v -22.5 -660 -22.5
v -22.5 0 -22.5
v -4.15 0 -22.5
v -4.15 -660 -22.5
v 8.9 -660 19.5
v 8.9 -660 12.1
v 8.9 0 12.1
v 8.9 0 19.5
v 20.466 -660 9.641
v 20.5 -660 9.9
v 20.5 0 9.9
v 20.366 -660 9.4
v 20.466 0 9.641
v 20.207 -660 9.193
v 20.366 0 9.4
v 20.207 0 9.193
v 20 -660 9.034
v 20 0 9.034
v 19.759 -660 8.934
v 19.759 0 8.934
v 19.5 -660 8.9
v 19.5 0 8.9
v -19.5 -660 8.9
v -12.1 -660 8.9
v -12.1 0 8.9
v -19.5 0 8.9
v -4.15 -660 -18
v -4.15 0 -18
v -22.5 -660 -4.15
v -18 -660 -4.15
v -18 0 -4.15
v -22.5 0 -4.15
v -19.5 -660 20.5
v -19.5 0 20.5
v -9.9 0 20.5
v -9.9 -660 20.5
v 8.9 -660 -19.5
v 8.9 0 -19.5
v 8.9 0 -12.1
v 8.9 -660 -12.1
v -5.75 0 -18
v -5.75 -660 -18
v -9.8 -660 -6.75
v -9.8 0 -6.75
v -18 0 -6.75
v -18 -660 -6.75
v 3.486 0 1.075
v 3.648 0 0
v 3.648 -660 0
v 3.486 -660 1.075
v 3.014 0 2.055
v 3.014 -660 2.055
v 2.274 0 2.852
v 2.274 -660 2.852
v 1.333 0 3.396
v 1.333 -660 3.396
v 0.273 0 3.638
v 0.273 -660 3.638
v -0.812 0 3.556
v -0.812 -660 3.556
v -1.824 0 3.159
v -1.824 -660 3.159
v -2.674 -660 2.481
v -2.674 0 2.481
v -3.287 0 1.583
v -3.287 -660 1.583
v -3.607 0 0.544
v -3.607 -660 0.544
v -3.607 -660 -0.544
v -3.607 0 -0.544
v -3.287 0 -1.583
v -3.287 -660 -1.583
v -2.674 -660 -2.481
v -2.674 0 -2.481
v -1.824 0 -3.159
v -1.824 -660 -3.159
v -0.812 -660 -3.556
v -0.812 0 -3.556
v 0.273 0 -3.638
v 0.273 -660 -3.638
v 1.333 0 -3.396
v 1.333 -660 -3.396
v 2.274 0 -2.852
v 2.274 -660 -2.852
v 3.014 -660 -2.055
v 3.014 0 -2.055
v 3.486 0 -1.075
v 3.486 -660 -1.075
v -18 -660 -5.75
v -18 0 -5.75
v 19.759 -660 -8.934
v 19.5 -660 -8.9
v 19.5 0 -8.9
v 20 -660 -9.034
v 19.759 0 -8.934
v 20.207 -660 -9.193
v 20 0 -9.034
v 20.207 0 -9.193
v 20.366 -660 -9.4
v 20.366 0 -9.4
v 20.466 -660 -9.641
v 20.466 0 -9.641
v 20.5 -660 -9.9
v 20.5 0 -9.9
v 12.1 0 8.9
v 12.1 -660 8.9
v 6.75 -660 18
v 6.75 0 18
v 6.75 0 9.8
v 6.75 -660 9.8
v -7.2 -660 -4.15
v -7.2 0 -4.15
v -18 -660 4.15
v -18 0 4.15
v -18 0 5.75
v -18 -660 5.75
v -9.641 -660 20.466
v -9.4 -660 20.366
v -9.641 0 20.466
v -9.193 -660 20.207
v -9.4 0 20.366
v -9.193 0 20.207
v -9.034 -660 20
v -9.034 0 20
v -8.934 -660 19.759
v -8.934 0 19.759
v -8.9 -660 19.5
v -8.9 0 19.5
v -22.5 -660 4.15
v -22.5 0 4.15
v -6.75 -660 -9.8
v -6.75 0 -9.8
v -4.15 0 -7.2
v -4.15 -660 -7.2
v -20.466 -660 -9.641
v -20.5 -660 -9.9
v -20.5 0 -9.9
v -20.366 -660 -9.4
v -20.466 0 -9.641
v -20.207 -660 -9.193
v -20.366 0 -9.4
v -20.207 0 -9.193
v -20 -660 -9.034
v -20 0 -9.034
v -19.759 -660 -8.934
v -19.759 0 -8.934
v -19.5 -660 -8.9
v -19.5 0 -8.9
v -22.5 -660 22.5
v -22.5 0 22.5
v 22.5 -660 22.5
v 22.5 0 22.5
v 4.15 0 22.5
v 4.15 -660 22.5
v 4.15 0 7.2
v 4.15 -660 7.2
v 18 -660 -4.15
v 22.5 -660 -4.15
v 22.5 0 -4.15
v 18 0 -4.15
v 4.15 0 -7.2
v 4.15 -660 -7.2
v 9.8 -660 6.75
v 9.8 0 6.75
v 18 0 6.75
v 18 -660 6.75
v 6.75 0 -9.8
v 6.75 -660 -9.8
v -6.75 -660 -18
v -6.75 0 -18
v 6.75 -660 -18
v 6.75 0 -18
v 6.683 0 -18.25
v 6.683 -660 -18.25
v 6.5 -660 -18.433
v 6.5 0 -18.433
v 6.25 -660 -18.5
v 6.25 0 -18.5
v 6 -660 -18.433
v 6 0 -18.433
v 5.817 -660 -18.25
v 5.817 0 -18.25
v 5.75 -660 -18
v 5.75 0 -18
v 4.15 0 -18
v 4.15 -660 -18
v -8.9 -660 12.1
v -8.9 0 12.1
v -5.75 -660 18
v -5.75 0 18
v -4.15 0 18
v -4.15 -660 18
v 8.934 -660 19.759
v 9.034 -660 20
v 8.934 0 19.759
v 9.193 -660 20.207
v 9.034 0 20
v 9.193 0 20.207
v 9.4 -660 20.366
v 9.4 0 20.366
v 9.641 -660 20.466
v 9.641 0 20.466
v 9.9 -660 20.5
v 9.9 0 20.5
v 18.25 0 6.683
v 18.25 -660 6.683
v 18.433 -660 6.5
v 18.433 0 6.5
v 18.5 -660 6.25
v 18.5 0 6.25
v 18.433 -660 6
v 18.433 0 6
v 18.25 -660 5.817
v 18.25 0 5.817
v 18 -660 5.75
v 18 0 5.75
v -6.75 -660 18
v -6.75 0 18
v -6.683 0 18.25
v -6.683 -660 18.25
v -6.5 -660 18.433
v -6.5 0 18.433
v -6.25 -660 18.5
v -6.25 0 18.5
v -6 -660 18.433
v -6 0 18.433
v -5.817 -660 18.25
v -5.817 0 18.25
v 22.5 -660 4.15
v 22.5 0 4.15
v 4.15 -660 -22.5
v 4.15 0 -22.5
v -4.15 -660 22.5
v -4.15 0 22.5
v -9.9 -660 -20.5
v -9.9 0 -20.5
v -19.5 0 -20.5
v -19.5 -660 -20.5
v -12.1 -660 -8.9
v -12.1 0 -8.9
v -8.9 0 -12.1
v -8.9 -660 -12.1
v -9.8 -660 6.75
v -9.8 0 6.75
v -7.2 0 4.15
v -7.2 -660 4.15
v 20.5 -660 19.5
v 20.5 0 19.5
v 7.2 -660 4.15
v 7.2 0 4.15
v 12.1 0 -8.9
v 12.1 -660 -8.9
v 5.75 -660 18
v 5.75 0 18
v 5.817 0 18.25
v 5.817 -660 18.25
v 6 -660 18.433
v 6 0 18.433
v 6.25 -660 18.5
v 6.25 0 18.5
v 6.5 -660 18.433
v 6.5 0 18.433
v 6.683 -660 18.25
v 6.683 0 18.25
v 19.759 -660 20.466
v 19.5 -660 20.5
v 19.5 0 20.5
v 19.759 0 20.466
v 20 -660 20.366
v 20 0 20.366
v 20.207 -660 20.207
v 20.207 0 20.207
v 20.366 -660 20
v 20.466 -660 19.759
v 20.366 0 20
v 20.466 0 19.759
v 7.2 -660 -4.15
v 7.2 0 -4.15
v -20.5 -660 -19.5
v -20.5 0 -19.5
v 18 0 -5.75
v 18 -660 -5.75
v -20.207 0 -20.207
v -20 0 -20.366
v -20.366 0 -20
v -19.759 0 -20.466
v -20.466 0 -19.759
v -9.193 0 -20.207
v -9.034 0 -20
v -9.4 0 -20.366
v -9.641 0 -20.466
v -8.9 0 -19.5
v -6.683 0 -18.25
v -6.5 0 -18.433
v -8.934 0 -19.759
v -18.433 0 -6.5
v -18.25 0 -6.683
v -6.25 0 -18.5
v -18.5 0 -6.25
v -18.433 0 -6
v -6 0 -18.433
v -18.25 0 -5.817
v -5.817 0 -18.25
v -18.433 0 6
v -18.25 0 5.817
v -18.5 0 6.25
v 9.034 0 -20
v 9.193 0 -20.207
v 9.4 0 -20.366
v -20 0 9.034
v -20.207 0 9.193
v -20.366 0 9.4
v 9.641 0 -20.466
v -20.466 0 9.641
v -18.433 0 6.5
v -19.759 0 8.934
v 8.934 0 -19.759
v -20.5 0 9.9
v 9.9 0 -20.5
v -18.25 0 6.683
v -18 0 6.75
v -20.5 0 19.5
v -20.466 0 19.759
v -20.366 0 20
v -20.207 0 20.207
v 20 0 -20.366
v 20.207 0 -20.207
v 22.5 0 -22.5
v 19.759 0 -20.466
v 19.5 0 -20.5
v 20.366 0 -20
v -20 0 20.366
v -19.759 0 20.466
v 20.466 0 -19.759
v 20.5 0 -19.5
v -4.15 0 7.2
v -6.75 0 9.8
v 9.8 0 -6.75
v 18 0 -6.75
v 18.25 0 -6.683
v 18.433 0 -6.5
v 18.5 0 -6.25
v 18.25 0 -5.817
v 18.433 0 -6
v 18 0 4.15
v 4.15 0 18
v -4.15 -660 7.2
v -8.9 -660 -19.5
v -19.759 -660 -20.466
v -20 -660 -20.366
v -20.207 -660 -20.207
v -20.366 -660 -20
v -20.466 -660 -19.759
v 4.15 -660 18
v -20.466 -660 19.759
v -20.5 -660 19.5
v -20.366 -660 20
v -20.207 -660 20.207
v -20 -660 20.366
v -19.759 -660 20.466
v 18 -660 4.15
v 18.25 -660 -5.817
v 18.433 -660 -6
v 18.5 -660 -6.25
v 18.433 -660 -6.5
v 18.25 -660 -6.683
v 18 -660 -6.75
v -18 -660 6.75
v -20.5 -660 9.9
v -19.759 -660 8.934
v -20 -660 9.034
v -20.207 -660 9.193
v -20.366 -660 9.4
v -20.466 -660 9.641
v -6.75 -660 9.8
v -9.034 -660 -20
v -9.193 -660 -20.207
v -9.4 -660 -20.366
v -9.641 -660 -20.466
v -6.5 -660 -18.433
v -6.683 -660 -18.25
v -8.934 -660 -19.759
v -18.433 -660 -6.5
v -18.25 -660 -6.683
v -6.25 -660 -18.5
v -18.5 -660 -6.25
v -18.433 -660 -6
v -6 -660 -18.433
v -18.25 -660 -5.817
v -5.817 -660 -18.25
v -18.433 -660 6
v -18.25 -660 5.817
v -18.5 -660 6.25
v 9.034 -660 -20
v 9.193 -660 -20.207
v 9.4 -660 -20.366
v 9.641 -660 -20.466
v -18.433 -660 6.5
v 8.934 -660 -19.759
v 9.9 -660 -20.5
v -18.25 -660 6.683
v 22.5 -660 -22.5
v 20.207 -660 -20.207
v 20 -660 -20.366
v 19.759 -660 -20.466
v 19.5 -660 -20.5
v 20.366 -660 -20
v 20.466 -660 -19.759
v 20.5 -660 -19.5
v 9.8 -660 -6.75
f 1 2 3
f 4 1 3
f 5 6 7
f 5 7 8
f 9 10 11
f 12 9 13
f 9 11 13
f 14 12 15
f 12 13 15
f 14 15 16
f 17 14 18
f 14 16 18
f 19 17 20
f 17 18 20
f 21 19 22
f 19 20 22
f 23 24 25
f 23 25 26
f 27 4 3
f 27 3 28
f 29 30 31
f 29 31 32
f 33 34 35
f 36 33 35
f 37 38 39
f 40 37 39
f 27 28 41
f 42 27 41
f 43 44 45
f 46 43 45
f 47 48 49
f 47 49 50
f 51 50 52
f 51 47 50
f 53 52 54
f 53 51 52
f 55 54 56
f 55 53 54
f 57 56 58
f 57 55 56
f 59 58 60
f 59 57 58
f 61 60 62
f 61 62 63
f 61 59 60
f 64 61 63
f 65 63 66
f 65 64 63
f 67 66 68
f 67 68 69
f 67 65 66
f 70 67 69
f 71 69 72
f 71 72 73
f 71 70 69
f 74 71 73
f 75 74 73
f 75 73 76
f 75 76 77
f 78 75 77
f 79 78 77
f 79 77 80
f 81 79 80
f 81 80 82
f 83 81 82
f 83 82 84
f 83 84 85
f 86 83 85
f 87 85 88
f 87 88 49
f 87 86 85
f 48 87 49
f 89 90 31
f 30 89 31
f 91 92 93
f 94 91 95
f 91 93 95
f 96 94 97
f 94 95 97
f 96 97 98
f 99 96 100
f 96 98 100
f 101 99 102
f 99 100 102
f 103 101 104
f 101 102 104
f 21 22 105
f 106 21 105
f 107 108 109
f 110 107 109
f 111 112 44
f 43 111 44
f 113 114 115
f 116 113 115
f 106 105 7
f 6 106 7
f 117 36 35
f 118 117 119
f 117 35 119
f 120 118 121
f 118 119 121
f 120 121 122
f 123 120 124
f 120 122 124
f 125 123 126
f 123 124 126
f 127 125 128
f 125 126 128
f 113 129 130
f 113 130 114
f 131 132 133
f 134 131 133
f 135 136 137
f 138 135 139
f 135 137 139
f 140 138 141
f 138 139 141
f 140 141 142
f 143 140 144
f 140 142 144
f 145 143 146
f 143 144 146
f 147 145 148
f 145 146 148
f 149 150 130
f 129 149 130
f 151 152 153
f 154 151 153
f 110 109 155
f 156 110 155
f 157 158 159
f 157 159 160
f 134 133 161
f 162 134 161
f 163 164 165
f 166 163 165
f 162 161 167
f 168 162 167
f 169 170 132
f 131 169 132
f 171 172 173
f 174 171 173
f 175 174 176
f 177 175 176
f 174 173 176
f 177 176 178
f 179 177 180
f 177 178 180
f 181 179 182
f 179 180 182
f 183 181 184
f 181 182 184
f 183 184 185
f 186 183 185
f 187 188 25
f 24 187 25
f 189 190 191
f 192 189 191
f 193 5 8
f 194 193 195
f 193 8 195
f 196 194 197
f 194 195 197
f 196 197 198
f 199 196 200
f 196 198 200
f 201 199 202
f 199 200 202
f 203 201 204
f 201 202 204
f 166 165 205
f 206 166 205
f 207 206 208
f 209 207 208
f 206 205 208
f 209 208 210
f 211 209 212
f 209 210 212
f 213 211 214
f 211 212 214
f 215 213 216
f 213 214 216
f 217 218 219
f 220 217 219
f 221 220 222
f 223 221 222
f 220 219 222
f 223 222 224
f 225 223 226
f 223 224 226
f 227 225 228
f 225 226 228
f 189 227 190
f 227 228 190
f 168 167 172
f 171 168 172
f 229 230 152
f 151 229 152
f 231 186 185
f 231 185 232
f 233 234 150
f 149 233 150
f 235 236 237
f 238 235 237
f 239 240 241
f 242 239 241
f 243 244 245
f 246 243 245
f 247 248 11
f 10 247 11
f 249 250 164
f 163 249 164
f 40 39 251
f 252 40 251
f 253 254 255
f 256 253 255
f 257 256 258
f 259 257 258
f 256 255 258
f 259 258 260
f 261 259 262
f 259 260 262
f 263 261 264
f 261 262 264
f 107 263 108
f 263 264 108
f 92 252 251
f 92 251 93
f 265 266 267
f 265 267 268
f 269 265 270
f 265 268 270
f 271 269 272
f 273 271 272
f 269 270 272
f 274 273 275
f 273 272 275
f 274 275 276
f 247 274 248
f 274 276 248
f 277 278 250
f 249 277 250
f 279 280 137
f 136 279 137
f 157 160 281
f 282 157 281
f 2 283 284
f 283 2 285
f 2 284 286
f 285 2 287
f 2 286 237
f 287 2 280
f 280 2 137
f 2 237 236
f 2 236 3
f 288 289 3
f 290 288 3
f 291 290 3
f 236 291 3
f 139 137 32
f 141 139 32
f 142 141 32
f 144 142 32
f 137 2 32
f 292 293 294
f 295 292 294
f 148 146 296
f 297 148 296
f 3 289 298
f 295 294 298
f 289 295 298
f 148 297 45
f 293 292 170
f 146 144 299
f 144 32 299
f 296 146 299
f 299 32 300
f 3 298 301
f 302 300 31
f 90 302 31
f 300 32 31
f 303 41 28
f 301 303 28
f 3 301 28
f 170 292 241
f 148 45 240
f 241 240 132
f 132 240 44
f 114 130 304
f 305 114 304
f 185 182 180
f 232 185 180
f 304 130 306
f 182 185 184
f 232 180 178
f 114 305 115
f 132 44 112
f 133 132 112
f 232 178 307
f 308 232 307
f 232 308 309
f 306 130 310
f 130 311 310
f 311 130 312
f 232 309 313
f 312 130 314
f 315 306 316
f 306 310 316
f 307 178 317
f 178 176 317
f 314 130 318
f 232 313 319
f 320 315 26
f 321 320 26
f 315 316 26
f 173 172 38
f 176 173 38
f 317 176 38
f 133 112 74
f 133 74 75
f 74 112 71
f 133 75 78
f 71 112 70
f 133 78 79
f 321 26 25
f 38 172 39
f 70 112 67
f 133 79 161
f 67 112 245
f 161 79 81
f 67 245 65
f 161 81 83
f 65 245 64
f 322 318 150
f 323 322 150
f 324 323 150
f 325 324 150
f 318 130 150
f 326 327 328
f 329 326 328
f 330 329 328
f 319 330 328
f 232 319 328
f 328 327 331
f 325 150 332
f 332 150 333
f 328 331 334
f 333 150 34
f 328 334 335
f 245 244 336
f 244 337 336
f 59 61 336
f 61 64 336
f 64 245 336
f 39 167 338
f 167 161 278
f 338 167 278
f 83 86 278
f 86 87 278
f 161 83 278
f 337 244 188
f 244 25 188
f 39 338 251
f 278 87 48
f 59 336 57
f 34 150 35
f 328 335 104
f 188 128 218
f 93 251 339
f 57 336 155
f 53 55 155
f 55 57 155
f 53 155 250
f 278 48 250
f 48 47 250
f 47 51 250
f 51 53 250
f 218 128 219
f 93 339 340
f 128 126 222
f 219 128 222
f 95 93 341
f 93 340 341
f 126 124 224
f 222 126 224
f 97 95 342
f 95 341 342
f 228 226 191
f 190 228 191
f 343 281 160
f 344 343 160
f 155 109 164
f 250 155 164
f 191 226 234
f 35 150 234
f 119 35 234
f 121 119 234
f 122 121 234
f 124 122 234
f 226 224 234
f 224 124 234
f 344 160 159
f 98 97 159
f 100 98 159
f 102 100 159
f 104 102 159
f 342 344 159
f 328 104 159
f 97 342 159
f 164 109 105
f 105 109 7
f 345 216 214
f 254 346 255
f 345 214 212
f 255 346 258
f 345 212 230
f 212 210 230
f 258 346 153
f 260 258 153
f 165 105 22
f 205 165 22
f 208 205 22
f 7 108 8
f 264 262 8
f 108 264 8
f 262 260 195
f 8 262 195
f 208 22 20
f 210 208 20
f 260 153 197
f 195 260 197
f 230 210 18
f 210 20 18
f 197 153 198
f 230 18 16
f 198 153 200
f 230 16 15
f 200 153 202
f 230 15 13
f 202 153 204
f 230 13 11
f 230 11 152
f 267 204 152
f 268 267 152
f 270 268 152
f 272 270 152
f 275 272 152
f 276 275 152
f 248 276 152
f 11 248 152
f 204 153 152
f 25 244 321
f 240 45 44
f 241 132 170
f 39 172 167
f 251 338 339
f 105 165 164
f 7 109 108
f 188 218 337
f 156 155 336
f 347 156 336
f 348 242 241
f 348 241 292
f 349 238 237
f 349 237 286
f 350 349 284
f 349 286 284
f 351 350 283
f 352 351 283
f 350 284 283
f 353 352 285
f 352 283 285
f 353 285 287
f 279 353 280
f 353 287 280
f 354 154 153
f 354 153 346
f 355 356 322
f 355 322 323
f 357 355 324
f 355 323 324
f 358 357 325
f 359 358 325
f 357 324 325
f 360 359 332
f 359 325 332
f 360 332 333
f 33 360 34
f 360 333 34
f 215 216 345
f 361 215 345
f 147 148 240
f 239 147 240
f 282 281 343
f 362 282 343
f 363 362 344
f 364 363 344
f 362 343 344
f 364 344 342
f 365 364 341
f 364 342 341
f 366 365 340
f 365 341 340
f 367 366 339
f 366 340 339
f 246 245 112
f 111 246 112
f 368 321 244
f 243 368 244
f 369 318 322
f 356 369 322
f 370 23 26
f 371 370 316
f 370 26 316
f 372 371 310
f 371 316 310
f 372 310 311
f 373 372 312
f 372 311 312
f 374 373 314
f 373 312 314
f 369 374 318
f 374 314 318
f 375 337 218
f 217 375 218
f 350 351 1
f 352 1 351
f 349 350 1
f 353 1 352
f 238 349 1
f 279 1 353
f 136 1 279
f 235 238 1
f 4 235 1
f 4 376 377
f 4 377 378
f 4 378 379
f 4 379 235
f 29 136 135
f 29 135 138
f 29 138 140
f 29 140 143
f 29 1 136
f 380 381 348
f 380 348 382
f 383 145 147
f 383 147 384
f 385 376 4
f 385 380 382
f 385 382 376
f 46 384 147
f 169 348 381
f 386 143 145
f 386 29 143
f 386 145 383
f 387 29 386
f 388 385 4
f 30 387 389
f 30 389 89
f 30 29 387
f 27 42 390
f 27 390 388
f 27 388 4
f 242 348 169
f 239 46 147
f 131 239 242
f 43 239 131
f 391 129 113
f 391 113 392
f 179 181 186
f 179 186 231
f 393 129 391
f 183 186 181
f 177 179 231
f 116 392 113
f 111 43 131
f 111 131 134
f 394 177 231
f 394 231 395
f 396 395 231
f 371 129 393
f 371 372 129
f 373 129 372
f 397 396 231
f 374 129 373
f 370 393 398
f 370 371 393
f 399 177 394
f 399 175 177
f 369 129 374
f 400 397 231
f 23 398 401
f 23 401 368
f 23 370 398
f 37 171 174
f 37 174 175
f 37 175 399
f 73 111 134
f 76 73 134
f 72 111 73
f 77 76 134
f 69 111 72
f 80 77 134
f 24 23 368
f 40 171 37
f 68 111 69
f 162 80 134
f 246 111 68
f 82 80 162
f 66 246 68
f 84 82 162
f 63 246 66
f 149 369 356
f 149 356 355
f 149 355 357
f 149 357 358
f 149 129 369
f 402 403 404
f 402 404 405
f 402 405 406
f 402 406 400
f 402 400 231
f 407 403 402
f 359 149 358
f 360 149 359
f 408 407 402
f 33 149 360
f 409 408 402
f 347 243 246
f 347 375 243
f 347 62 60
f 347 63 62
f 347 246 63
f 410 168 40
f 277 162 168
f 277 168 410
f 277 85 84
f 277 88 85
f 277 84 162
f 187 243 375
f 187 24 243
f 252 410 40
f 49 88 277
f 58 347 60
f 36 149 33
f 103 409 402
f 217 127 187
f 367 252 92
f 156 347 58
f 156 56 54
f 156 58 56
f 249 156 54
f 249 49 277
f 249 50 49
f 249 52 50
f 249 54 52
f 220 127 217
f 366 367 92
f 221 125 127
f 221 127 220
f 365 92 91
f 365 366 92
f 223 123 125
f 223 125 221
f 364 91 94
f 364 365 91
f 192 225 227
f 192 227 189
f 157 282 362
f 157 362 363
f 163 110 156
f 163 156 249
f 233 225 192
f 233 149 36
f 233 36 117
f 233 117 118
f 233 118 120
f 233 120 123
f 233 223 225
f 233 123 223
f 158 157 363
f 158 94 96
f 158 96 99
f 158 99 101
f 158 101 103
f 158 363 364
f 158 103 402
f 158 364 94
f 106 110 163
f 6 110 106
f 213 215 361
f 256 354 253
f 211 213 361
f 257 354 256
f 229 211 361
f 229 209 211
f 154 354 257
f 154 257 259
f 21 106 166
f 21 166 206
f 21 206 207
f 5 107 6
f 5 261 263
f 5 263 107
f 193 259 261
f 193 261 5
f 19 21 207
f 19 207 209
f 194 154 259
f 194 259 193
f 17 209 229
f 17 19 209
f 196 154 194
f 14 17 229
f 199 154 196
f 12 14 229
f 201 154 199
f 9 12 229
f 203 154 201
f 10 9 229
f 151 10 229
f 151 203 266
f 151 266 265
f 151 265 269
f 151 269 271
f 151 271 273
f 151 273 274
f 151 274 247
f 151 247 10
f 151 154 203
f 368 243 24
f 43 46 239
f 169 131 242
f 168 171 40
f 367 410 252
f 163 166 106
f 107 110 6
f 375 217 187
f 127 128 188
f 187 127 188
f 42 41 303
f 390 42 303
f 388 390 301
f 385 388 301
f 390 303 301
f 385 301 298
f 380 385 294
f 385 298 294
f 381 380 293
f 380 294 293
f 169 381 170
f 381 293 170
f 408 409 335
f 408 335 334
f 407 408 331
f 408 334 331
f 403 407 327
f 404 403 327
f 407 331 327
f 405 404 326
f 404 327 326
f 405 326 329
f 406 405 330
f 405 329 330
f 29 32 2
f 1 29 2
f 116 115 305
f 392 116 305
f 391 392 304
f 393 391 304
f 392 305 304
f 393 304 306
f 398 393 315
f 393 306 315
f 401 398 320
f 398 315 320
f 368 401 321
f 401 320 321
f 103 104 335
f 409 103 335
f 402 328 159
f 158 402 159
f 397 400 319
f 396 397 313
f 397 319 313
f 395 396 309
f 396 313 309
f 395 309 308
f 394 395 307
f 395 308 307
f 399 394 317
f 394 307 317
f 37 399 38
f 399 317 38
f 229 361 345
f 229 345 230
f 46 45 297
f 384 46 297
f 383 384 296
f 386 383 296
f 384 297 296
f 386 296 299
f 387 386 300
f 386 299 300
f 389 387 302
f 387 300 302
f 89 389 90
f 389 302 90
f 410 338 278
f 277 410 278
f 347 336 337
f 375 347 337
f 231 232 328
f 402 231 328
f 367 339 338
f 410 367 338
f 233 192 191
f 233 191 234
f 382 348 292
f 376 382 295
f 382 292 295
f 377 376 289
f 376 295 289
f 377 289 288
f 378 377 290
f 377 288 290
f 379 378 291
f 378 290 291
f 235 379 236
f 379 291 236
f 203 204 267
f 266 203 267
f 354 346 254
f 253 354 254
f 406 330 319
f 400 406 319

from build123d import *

# Parameters (mm, degrees)
F0_R     = 3.647768
F1_DEPTH = 660


with BuildPart() as f1:
    # F0 (on Front) → F1 (new body)
    with BuildSketch(Plane.XZ):
        with BuildLine():
            Line((-4.15, 22.5), (-22.5, 22.5))
            Line((-22.5, 22.5), (-22.5, 4.15))
            Line((-22.5, 4.15), (-18, 4.15))
            Line((-18, 4.15), (-18, 5.75))
            ThreePointArc((-18, 5.75), (-18.5, 6.25), (-18, 6.75))
            Line((-18, 6.75), (-9.8, 6.75))
            Line((-9.8, 6.75), (-7.2, 4.15))
            Line((-7.2, 4.15), (-7.2, -4.15))
            Line((-7.2, -4.15), (-9.8, -6.75))
            Line((-9.8, -6.75), (-18, -6.75))
            ThreePointArc((-18, -6.75), (-18.5, -6.25), (-18, -5.75))
            Line((-18, -5.75), (-18, -4.15))
            Line((-18, -4.15), (-22.5, -4.15))
            Line((-22.5, -4.15), (-22.5, -22.5))
            Line((-22.5, -22.5), (-4.15, -22.5))
            Line((-4.15, -22.5), (-4.15, -18))
            Line((-4.15, -18), (-5.75, -18))
            ThreePointArc((-5.75, -18), (-6.25, -18.5), (-6.75, -18))
            Line((-6.75, -18), (-6.75, -9.8))
            Line((-6.75, -9.8), (-4.15, -7.2))
            Line((-4.15, -7.2), (4.15, -7.2))
            Line((4.15, -7.2), (6.75, -9.8))
            Line((6.75, -9.8), (6.75, -18))
            ThreePointArc((6.75, -18), (6.25, -18.5), (5.75, -18))
            Line((5.75, -18), (4.15, -18))
            Line((4.15, -18), (4.15, -22.5))
            Line((4.15, -22.5), (22.5, -22.5))
            Line((22.5, -22.5), (22.5, -4.15))
            Line((22.5, -4.15), (18, -4.15))
            Line((18, -4.15), (18, -5.75))
            ThreePointArc((18, -5.75), (18.5, -6.25), (18, -6.75))
            Line((18, -6.75), (9.8, -6.75))
            Line((9.8, -6.75), (7.2, -4.15))
            Line((7.2, -4.15), (7.2, 4.15))
            Line((7.2, 4.15), (9.8, 6.75))
            Line((9.8, 6.75), (18, 6.75))
            ThreePointArc((18, 6.75), (18.5, 6.25), (18, 5.75))
            Line((18, 5.75), (18, 4.15))
            Line((18, 4.15), (22.5, 4.15))
            Line((22.5, 4.15), (22.5, 22.5))
            Line((22.5, 22.5), (4.15, 22.5))
            Line((4.15, 22.5), (4.15, 18))
            Line((4.15, 18), (5.75, 18))
            ThreePointArc((5.75, 18), (6.25, 18.5), (6.75, 18))
            Line((6.75, 18), (6.75, 9.8))
            Line((6.75, 9.8), (4.15, 7.2))
            Line((4.15, 7.2), (-4.15, 7.2))
            Line((-4.15, 7.2), (-6.75, 9.8))
            Line((-6.75, 9.8), (-6.75, 18))
            ThreePointArc((-6.75, 18), (-6.25, 18.5), (-5.75, 18))
            Line((-5.75, 18), (-4.15, 18))
            Line((-4.15, 18), (-4.15, 22.5))
        make_face()
        with BuildLine():
            Line((-8.9, -12.1), (-8.9, -19.5))
            ThreePointArc((-8.9, -19.5), (-9.192893, -20.207107), (-9.9, -20.5))
            Line((-9.9, -20.5), (-19.5, -20.5))
            ThreePointArc((-19.5, -20.5), (-20.207107, -20.207107), (-20.5, -19.5))
            Line((-20.5, -19.5), (-20.5, -9.9))
            ThreePointArc((-20.5, -9.9), (-20.207107, -9.192893), (-19.5, -8.9))
            Line((-19.5, -8.9), (-12.1, -8.9))
            Line((-12.1, -8.9), (-8.9, -12.1))
        make_face(mode=Mode.SUBTRACT)
        with BuildLine():
            Line((8.9, -12.1), (12.1, -8.9))
            Line((12.1, -8.9), (19.5, -8.9))
            ThreePointArc((19.5, -8.9), (20.207107, -9.192893), (20.5, -9.9))
            Line((20.5, -9.9), (20.5, -19.5))
            ThreePointArc((20.5, -19.5), (20.207107, -20.207107), (19.5, -20.5))
            Line((19.5, -20.5), (9.9, -20.5))
            ThreePointArc((9.9, -20.5), (9.192893, -20.207107), (8.9, -19.5))
            Line((8.9, -19.5), (8.9, -12.1))
        make_face(mode=Mode.SUBTRACT)
        with BuildLine():
            ThreePointArc((-20.5, 19.5), (-20.207107, 20.207107), (-19.5, 20.5))
            Line((-19.5, 20.5), (-9.9, 20.5))
            ThreePointArc((-9.9, 20.5), (-9.192893, 20.207107), (-8.9, 19.5))
            Line((-8.9, 19.5), (-8.9, 12.1))
            Line((-8.9, 12.1), (-12.1, 8.9))
            Line((-12.1, 8.9), (-19.5, 8.9))
            ThreePointArc((-19.5, 8.9), (-20.207107, 9.192893), (-20.5, 9.9))
            Line((-20.5, 9.9), (-20.5, 19.5))
        make_face(mode=Mode.SUBTRACT)
        Circle(F0_R, mode=Mode.SUBTRACT)
        with BuildLine():
            Line((12.1, 8.9), (8.9, 12.1))
            Line((8.9, 12.1), (8.9, 19.5))
            ThreePointArc((8.9, 19.5), (9.192893, 20.207107), (9.9, 20.5))
            Line((9.9, 20.5), (19.5, 20.5))
            ThreePointArc((19.5, 20.5), (20.207107, 20.207107), (20.5, 19.5))
            Line((20.5, 19.5), (20.5, 9.9))
            ThreePointArc((20.5, 9.9), (20.207107, 9.192893), (19.5, 8.9))
            Line((19.5, 8.9), (12.1, 8.9))
        make_face(mode=Mode.SUBTRACT)
    extrude(amount=F1_DEPTH)


solid = f1.part
